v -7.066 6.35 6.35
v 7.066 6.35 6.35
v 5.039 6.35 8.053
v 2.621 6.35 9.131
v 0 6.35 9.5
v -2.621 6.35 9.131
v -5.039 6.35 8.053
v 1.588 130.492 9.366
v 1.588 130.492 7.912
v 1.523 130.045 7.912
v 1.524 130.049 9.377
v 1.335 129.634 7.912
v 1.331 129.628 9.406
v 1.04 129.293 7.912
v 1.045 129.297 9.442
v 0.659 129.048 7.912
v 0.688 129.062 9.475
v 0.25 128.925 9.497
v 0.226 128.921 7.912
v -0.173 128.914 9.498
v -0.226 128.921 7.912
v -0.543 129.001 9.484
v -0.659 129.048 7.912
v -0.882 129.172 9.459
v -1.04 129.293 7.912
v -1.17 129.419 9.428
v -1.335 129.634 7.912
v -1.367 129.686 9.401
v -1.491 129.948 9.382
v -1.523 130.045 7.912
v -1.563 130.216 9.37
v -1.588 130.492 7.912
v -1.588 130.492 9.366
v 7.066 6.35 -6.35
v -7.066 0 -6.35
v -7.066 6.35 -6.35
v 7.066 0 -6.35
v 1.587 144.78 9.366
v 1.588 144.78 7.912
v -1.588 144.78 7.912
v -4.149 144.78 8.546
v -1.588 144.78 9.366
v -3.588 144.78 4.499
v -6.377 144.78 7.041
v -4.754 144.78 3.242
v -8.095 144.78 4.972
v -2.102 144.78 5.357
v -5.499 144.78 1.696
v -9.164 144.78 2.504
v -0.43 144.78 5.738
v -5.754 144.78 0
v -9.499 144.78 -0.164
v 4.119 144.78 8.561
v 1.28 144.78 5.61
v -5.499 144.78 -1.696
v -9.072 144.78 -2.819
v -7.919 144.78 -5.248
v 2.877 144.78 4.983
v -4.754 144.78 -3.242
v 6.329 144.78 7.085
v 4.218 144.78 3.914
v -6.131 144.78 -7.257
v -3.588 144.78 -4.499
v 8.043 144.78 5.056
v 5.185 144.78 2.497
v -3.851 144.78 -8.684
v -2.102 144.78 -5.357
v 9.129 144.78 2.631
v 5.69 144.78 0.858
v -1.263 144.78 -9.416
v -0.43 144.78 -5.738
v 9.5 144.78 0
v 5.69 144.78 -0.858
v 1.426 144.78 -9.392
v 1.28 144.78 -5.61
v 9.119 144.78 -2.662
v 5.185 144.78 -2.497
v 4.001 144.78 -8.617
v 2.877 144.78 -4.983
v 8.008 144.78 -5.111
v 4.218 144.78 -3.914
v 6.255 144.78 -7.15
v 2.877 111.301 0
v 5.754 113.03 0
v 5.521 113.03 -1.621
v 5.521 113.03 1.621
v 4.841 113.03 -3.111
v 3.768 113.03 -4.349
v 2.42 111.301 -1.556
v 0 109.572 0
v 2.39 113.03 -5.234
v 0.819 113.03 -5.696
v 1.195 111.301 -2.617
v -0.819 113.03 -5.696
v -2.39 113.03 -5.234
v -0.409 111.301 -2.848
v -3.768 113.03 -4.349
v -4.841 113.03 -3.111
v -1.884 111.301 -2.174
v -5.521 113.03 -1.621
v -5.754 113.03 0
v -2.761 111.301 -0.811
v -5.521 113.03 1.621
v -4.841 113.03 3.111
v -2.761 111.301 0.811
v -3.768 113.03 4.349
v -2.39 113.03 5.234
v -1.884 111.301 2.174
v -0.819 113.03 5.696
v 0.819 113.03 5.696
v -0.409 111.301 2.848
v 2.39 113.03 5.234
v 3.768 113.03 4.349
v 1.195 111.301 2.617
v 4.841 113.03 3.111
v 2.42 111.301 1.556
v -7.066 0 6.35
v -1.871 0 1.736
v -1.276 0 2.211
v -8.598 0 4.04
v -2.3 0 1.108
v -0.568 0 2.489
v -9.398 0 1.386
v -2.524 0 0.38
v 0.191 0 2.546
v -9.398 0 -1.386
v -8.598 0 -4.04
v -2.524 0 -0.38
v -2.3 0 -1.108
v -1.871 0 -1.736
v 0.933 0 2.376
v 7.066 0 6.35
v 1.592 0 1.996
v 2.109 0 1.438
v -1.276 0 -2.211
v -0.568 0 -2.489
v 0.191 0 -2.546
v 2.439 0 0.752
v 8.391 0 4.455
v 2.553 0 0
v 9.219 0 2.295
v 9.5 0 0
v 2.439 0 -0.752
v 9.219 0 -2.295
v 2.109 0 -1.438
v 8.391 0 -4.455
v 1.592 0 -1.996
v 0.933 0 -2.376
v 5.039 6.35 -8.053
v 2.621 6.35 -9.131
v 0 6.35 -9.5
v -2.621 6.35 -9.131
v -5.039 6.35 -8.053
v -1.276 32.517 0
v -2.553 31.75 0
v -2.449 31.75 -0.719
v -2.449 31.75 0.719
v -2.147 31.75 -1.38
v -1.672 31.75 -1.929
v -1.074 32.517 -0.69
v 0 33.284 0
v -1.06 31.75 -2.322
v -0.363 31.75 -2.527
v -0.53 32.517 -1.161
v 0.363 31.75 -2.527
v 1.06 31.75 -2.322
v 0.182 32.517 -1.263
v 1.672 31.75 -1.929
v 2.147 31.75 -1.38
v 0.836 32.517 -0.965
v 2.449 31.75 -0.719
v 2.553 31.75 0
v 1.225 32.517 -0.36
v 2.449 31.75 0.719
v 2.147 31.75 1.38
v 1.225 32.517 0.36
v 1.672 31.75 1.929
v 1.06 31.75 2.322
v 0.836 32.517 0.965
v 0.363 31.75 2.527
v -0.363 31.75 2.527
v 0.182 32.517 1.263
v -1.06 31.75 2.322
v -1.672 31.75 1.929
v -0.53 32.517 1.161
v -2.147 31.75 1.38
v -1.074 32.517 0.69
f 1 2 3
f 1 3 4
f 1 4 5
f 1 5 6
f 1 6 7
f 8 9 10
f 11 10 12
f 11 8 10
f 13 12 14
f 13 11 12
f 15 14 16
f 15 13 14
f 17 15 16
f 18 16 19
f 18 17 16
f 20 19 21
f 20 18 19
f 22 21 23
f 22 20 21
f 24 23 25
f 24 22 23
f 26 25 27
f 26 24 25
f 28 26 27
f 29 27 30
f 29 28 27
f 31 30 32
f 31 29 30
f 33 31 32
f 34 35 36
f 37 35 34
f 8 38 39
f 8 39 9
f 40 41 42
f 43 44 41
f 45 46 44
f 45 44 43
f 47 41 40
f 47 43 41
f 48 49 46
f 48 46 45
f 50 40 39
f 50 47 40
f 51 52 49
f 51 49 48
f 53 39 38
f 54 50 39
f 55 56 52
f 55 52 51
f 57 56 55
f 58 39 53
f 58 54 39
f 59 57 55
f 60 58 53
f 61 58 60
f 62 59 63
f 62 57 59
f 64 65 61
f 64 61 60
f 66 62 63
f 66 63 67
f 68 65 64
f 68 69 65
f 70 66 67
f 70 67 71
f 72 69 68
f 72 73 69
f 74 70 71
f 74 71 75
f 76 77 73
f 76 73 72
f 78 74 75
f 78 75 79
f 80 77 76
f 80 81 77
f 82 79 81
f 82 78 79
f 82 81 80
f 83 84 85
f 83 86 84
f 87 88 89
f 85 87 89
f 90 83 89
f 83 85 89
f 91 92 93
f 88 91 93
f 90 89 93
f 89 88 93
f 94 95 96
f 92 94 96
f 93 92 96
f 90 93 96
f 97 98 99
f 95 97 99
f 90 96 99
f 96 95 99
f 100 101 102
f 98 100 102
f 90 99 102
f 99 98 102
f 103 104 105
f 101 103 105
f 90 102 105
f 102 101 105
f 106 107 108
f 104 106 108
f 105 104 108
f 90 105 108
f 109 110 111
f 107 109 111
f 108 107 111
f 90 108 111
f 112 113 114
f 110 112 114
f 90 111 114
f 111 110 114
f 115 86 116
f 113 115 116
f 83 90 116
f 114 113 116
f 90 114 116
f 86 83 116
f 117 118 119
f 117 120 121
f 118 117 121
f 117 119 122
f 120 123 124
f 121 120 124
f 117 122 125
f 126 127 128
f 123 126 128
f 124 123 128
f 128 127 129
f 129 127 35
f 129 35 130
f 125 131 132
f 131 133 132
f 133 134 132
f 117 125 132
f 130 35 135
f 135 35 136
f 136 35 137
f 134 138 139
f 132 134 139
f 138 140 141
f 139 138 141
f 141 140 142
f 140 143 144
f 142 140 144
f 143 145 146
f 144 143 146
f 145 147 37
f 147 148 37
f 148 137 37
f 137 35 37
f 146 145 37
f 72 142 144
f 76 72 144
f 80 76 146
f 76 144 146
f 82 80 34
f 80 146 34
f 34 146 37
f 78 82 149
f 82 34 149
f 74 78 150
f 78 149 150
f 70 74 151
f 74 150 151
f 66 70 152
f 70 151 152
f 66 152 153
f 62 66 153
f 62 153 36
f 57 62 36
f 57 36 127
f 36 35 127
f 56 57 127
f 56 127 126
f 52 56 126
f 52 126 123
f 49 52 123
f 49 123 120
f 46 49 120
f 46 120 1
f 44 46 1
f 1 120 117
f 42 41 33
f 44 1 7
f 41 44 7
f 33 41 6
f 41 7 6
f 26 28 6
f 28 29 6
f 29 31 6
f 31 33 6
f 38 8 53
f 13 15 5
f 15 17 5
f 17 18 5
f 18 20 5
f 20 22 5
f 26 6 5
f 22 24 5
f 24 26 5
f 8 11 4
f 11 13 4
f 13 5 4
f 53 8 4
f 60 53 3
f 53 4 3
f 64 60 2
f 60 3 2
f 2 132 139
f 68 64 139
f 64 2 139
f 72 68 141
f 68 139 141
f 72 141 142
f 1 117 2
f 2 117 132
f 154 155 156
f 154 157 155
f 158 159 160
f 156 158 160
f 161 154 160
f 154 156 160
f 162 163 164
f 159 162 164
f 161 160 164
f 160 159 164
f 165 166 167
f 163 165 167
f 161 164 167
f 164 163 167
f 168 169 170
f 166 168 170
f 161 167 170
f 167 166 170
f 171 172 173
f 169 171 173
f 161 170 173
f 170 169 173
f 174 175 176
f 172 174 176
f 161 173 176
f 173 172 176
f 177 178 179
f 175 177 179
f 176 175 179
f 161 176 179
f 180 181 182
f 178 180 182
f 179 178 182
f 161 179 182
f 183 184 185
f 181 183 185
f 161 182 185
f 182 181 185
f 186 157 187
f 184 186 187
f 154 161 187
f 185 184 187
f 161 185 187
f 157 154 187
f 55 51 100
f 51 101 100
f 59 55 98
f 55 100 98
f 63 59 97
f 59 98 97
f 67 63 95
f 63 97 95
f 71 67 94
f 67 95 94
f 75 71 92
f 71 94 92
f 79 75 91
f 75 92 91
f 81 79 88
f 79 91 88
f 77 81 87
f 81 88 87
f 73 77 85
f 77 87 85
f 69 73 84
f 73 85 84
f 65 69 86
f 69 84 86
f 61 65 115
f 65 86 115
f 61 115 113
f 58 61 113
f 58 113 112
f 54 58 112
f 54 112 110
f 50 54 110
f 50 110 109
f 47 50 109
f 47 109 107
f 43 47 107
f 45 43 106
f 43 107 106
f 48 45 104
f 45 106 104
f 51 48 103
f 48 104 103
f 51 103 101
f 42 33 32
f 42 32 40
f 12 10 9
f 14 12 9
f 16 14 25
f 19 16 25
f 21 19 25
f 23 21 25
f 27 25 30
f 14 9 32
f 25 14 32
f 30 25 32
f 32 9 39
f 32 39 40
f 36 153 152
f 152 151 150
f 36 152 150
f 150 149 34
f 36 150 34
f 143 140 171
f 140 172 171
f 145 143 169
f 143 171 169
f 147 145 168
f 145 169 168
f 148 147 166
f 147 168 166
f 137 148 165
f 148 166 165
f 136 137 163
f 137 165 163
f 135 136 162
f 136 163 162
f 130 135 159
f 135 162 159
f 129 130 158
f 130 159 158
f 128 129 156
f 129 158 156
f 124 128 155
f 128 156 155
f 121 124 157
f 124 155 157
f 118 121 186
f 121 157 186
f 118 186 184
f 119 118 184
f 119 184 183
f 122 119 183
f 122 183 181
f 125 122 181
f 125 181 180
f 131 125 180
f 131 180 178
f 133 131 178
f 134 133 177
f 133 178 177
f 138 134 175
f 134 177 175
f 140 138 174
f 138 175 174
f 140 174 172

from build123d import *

# Parameters (mm, degrees)
SKETCH1_R                       = 9.5
BOSS_EXTRUDE1_DEPTH             = 144.78
CUT_EXTRUDE1_DEPTH              = 6.35
TAP_DRILL_FOR_1_4_20_TAP1_D     = 5.1054
TAP_DRILL_FOR_1_4_20_TAP1_DEPTH = 31.75
TAP_DRILL_FOR_1_4_20_TAP1_TIP   = 1.533816902
TAP_DRILL_FOR_1_2_20_TAP1_D     = 11.50874
TAP_DRILL_FOR_1_2_20_TAP1_DEPTH = 31.75
TAP_DRILL_FOR_1_2_20_TAP1_TIP   = 3.45757432
CUT_EXTRUDE2_DEPTH              = 1.5875


with BuildPart() as part:
    # Sketch1 → Boss-Extrude1 (new body)
    with BuildSketch(Plane(origin=(0, 0, 0), x_dir=(1, 0, 0), z_dir=(0, 1, 0))):
        Circle(SKETCH1_R)
    extrude(amount=BOSS_EXTRUDE1_DEPTH)

    # Sketch2 → Cut-Extrude1 (cut)
    with BuildSketch(Plane(origin=(0, 0, 0), x_dir=(-1, 0, 0), z_dir=(0, -1, 0))):
        with BuildLine():
            Line((7.065939428, -6.35), (-7.065939428, -6.35))
            ThreePointArc((-7.065939428, -6.35), (0, -9.5), (7.065939428, -6.35))
        make_face()
        with BuildLine():
            Line((7.065939428, 6.35), (-7.065939428, 6.35))
            ThreePointArc((-7.065939428, 6.35), (0, 9.5), (7.065939428, 6.35))
        make_face()
    extrude(amount=-CUT_EXTRUDE1_DEPTH, mode=Mode.SUBTRACT)

    # Tap Drill for 1/4-20 Tap1
    with Locations(Plane(origin=(0, 0, 0), x_dir=(-1, 0, 0), z_dir=(0, -1, 0))):
        with Locations((0, 0)):
            Hole(TAP_DRILL_FOR_1_4_20_TAP1_D / 2, depth=TAP_DRILL_FOR_1_4_20_TAP1_DEPTH)
            with Locations((0, 0, -(TAP_DRILL_FOR_1_4_20_TAP1_DEPTH + TAP_DRILL_FOR_1_4_20_TAP1_TIP / 2))):  # 118° drill point
                Cone(0, TAP_DRILL_FOR_1_4_20_TAP1_D / 2, TAP_DRILL_FOR_1_4_20_TAP1_TIP, mode=Mode.SUBTRACT)

    # Tap Drill for 1/2-20 Tap1
    with Locations(Plane(origin=(0, 144.78, 0), x_dir=(1, 0, 0), z_dir=(0, 1, 0))):
        with Locations((0, 0)):
            Hole(TAP_DRILL_FOR_1_2_20_TAP1_D / 2, depth=TAP_DRILL_FOR_1_2_20_TAP1_DEPTH)
            with Locations((0, 0, -(TAP_DRILL_FOR_1_2_20_TAP1_DEPTH + TAP_DRILL_FOR_1_2_20_TAP1_TIP / 2))):  # 118° drill point
                Cone(0, TAP_DRILL_FOR_1_2_20_TAP1_D / 2, TAP_DRILL_FOR_1_2_20_TAP1_TIP, mode=Mode.SUBTRACT)

    # Sketch7 → Cut-Extrude2 (cut)
    with BuildSketch(Plane.XY.offset(9.5)):
        with BuildLine():
            Line((-1.5875, 130.4925), (-1.5875, 144.78))
            Line((-1.5875, 144.78), (1.5875, 144.78))
            Line((1.5875, 144.78), (1.5875, 130.4925))
            ThreePointArc((1.5875, 130.4925), (0, 128.905), (-1.5875, 130.4925))
        make_face()
    extrude(amount=-CUT_EXTRUDE2_DEPTH, mode=Mode.SUBTRACT)


solid = part.part
